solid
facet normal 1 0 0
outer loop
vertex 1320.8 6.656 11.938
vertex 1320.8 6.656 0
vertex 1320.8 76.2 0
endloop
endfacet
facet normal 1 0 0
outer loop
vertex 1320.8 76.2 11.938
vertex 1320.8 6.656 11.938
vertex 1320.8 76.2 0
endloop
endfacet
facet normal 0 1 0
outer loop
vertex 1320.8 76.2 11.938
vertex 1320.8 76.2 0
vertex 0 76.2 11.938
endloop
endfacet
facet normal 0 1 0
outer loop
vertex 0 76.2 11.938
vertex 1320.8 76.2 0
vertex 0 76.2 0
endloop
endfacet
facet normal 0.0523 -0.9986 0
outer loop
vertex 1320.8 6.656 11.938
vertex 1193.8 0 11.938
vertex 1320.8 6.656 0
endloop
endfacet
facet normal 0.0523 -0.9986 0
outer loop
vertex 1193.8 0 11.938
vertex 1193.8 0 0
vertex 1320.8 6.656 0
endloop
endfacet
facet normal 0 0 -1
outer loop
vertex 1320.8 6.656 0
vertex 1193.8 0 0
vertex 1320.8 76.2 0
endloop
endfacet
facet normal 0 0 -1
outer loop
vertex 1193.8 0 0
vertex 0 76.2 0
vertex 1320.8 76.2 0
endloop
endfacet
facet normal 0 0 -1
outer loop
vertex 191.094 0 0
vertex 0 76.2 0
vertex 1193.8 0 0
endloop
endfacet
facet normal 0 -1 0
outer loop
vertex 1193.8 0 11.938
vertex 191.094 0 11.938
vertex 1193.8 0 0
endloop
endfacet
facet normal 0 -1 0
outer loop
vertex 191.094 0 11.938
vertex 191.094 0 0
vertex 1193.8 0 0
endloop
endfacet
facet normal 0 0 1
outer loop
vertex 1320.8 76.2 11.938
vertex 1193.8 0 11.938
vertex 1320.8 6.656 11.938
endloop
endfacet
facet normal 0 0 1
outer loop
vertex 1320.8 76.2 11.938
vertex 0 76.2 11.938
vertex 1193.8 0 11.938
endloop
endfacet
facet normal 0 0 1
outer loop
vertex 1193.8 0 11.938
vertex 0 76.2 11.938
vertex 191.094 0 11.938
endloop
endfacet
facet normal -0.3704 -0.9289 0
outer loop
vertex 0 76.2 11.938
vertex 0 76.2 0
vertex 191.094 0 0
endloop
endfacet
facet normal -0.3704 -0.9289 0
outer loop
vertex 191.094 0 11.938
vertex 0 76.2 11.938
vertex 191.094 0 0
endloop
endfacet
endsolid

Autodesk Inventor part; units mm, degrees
ref_plane "YZ Plane" through (0, 0, 0) normal (1, 0, 0) x (0, 1, 0)
ref_plane "XZ Plane" through (0, 0, 0) normal (0, 1, 0) x (-1, 0, 0)
ref_plane "XY Plane" through (0, 0, 0) normal (0, 0, 1) x (1, 0, 0)
sketch "Sketch1" plane through (0, 0, 0) normal (0, 0, 1) x (1, 0, 0)
  line L0 (0, 0) -> (1320.8, 0)
  line L1 (1320.8, 0) -> (1320.8, 76.2)
  line L2 (1320.8, 76.2) -> (0, 76.2)
  line L3 (0, 76.2) -> (0, 0)
  line L4 (1193.8, 0) -> (1320.8, 6.6558)
  line L5 (0, 76.2) -> (191.0937, 0)
  dimension "d0" = 76.2
  dimension "d1" = 1320.8
  dimension "d2" = 3
  dimension "d3" = 127
  dimension "d5" = 21.74
extrude "Extrusion1" add sketch "Sketch1" along normal blind 11.938 contours L5 L2 L1 L4 L0
properties part number "Antitorque span" material "Wood (Oak)"
